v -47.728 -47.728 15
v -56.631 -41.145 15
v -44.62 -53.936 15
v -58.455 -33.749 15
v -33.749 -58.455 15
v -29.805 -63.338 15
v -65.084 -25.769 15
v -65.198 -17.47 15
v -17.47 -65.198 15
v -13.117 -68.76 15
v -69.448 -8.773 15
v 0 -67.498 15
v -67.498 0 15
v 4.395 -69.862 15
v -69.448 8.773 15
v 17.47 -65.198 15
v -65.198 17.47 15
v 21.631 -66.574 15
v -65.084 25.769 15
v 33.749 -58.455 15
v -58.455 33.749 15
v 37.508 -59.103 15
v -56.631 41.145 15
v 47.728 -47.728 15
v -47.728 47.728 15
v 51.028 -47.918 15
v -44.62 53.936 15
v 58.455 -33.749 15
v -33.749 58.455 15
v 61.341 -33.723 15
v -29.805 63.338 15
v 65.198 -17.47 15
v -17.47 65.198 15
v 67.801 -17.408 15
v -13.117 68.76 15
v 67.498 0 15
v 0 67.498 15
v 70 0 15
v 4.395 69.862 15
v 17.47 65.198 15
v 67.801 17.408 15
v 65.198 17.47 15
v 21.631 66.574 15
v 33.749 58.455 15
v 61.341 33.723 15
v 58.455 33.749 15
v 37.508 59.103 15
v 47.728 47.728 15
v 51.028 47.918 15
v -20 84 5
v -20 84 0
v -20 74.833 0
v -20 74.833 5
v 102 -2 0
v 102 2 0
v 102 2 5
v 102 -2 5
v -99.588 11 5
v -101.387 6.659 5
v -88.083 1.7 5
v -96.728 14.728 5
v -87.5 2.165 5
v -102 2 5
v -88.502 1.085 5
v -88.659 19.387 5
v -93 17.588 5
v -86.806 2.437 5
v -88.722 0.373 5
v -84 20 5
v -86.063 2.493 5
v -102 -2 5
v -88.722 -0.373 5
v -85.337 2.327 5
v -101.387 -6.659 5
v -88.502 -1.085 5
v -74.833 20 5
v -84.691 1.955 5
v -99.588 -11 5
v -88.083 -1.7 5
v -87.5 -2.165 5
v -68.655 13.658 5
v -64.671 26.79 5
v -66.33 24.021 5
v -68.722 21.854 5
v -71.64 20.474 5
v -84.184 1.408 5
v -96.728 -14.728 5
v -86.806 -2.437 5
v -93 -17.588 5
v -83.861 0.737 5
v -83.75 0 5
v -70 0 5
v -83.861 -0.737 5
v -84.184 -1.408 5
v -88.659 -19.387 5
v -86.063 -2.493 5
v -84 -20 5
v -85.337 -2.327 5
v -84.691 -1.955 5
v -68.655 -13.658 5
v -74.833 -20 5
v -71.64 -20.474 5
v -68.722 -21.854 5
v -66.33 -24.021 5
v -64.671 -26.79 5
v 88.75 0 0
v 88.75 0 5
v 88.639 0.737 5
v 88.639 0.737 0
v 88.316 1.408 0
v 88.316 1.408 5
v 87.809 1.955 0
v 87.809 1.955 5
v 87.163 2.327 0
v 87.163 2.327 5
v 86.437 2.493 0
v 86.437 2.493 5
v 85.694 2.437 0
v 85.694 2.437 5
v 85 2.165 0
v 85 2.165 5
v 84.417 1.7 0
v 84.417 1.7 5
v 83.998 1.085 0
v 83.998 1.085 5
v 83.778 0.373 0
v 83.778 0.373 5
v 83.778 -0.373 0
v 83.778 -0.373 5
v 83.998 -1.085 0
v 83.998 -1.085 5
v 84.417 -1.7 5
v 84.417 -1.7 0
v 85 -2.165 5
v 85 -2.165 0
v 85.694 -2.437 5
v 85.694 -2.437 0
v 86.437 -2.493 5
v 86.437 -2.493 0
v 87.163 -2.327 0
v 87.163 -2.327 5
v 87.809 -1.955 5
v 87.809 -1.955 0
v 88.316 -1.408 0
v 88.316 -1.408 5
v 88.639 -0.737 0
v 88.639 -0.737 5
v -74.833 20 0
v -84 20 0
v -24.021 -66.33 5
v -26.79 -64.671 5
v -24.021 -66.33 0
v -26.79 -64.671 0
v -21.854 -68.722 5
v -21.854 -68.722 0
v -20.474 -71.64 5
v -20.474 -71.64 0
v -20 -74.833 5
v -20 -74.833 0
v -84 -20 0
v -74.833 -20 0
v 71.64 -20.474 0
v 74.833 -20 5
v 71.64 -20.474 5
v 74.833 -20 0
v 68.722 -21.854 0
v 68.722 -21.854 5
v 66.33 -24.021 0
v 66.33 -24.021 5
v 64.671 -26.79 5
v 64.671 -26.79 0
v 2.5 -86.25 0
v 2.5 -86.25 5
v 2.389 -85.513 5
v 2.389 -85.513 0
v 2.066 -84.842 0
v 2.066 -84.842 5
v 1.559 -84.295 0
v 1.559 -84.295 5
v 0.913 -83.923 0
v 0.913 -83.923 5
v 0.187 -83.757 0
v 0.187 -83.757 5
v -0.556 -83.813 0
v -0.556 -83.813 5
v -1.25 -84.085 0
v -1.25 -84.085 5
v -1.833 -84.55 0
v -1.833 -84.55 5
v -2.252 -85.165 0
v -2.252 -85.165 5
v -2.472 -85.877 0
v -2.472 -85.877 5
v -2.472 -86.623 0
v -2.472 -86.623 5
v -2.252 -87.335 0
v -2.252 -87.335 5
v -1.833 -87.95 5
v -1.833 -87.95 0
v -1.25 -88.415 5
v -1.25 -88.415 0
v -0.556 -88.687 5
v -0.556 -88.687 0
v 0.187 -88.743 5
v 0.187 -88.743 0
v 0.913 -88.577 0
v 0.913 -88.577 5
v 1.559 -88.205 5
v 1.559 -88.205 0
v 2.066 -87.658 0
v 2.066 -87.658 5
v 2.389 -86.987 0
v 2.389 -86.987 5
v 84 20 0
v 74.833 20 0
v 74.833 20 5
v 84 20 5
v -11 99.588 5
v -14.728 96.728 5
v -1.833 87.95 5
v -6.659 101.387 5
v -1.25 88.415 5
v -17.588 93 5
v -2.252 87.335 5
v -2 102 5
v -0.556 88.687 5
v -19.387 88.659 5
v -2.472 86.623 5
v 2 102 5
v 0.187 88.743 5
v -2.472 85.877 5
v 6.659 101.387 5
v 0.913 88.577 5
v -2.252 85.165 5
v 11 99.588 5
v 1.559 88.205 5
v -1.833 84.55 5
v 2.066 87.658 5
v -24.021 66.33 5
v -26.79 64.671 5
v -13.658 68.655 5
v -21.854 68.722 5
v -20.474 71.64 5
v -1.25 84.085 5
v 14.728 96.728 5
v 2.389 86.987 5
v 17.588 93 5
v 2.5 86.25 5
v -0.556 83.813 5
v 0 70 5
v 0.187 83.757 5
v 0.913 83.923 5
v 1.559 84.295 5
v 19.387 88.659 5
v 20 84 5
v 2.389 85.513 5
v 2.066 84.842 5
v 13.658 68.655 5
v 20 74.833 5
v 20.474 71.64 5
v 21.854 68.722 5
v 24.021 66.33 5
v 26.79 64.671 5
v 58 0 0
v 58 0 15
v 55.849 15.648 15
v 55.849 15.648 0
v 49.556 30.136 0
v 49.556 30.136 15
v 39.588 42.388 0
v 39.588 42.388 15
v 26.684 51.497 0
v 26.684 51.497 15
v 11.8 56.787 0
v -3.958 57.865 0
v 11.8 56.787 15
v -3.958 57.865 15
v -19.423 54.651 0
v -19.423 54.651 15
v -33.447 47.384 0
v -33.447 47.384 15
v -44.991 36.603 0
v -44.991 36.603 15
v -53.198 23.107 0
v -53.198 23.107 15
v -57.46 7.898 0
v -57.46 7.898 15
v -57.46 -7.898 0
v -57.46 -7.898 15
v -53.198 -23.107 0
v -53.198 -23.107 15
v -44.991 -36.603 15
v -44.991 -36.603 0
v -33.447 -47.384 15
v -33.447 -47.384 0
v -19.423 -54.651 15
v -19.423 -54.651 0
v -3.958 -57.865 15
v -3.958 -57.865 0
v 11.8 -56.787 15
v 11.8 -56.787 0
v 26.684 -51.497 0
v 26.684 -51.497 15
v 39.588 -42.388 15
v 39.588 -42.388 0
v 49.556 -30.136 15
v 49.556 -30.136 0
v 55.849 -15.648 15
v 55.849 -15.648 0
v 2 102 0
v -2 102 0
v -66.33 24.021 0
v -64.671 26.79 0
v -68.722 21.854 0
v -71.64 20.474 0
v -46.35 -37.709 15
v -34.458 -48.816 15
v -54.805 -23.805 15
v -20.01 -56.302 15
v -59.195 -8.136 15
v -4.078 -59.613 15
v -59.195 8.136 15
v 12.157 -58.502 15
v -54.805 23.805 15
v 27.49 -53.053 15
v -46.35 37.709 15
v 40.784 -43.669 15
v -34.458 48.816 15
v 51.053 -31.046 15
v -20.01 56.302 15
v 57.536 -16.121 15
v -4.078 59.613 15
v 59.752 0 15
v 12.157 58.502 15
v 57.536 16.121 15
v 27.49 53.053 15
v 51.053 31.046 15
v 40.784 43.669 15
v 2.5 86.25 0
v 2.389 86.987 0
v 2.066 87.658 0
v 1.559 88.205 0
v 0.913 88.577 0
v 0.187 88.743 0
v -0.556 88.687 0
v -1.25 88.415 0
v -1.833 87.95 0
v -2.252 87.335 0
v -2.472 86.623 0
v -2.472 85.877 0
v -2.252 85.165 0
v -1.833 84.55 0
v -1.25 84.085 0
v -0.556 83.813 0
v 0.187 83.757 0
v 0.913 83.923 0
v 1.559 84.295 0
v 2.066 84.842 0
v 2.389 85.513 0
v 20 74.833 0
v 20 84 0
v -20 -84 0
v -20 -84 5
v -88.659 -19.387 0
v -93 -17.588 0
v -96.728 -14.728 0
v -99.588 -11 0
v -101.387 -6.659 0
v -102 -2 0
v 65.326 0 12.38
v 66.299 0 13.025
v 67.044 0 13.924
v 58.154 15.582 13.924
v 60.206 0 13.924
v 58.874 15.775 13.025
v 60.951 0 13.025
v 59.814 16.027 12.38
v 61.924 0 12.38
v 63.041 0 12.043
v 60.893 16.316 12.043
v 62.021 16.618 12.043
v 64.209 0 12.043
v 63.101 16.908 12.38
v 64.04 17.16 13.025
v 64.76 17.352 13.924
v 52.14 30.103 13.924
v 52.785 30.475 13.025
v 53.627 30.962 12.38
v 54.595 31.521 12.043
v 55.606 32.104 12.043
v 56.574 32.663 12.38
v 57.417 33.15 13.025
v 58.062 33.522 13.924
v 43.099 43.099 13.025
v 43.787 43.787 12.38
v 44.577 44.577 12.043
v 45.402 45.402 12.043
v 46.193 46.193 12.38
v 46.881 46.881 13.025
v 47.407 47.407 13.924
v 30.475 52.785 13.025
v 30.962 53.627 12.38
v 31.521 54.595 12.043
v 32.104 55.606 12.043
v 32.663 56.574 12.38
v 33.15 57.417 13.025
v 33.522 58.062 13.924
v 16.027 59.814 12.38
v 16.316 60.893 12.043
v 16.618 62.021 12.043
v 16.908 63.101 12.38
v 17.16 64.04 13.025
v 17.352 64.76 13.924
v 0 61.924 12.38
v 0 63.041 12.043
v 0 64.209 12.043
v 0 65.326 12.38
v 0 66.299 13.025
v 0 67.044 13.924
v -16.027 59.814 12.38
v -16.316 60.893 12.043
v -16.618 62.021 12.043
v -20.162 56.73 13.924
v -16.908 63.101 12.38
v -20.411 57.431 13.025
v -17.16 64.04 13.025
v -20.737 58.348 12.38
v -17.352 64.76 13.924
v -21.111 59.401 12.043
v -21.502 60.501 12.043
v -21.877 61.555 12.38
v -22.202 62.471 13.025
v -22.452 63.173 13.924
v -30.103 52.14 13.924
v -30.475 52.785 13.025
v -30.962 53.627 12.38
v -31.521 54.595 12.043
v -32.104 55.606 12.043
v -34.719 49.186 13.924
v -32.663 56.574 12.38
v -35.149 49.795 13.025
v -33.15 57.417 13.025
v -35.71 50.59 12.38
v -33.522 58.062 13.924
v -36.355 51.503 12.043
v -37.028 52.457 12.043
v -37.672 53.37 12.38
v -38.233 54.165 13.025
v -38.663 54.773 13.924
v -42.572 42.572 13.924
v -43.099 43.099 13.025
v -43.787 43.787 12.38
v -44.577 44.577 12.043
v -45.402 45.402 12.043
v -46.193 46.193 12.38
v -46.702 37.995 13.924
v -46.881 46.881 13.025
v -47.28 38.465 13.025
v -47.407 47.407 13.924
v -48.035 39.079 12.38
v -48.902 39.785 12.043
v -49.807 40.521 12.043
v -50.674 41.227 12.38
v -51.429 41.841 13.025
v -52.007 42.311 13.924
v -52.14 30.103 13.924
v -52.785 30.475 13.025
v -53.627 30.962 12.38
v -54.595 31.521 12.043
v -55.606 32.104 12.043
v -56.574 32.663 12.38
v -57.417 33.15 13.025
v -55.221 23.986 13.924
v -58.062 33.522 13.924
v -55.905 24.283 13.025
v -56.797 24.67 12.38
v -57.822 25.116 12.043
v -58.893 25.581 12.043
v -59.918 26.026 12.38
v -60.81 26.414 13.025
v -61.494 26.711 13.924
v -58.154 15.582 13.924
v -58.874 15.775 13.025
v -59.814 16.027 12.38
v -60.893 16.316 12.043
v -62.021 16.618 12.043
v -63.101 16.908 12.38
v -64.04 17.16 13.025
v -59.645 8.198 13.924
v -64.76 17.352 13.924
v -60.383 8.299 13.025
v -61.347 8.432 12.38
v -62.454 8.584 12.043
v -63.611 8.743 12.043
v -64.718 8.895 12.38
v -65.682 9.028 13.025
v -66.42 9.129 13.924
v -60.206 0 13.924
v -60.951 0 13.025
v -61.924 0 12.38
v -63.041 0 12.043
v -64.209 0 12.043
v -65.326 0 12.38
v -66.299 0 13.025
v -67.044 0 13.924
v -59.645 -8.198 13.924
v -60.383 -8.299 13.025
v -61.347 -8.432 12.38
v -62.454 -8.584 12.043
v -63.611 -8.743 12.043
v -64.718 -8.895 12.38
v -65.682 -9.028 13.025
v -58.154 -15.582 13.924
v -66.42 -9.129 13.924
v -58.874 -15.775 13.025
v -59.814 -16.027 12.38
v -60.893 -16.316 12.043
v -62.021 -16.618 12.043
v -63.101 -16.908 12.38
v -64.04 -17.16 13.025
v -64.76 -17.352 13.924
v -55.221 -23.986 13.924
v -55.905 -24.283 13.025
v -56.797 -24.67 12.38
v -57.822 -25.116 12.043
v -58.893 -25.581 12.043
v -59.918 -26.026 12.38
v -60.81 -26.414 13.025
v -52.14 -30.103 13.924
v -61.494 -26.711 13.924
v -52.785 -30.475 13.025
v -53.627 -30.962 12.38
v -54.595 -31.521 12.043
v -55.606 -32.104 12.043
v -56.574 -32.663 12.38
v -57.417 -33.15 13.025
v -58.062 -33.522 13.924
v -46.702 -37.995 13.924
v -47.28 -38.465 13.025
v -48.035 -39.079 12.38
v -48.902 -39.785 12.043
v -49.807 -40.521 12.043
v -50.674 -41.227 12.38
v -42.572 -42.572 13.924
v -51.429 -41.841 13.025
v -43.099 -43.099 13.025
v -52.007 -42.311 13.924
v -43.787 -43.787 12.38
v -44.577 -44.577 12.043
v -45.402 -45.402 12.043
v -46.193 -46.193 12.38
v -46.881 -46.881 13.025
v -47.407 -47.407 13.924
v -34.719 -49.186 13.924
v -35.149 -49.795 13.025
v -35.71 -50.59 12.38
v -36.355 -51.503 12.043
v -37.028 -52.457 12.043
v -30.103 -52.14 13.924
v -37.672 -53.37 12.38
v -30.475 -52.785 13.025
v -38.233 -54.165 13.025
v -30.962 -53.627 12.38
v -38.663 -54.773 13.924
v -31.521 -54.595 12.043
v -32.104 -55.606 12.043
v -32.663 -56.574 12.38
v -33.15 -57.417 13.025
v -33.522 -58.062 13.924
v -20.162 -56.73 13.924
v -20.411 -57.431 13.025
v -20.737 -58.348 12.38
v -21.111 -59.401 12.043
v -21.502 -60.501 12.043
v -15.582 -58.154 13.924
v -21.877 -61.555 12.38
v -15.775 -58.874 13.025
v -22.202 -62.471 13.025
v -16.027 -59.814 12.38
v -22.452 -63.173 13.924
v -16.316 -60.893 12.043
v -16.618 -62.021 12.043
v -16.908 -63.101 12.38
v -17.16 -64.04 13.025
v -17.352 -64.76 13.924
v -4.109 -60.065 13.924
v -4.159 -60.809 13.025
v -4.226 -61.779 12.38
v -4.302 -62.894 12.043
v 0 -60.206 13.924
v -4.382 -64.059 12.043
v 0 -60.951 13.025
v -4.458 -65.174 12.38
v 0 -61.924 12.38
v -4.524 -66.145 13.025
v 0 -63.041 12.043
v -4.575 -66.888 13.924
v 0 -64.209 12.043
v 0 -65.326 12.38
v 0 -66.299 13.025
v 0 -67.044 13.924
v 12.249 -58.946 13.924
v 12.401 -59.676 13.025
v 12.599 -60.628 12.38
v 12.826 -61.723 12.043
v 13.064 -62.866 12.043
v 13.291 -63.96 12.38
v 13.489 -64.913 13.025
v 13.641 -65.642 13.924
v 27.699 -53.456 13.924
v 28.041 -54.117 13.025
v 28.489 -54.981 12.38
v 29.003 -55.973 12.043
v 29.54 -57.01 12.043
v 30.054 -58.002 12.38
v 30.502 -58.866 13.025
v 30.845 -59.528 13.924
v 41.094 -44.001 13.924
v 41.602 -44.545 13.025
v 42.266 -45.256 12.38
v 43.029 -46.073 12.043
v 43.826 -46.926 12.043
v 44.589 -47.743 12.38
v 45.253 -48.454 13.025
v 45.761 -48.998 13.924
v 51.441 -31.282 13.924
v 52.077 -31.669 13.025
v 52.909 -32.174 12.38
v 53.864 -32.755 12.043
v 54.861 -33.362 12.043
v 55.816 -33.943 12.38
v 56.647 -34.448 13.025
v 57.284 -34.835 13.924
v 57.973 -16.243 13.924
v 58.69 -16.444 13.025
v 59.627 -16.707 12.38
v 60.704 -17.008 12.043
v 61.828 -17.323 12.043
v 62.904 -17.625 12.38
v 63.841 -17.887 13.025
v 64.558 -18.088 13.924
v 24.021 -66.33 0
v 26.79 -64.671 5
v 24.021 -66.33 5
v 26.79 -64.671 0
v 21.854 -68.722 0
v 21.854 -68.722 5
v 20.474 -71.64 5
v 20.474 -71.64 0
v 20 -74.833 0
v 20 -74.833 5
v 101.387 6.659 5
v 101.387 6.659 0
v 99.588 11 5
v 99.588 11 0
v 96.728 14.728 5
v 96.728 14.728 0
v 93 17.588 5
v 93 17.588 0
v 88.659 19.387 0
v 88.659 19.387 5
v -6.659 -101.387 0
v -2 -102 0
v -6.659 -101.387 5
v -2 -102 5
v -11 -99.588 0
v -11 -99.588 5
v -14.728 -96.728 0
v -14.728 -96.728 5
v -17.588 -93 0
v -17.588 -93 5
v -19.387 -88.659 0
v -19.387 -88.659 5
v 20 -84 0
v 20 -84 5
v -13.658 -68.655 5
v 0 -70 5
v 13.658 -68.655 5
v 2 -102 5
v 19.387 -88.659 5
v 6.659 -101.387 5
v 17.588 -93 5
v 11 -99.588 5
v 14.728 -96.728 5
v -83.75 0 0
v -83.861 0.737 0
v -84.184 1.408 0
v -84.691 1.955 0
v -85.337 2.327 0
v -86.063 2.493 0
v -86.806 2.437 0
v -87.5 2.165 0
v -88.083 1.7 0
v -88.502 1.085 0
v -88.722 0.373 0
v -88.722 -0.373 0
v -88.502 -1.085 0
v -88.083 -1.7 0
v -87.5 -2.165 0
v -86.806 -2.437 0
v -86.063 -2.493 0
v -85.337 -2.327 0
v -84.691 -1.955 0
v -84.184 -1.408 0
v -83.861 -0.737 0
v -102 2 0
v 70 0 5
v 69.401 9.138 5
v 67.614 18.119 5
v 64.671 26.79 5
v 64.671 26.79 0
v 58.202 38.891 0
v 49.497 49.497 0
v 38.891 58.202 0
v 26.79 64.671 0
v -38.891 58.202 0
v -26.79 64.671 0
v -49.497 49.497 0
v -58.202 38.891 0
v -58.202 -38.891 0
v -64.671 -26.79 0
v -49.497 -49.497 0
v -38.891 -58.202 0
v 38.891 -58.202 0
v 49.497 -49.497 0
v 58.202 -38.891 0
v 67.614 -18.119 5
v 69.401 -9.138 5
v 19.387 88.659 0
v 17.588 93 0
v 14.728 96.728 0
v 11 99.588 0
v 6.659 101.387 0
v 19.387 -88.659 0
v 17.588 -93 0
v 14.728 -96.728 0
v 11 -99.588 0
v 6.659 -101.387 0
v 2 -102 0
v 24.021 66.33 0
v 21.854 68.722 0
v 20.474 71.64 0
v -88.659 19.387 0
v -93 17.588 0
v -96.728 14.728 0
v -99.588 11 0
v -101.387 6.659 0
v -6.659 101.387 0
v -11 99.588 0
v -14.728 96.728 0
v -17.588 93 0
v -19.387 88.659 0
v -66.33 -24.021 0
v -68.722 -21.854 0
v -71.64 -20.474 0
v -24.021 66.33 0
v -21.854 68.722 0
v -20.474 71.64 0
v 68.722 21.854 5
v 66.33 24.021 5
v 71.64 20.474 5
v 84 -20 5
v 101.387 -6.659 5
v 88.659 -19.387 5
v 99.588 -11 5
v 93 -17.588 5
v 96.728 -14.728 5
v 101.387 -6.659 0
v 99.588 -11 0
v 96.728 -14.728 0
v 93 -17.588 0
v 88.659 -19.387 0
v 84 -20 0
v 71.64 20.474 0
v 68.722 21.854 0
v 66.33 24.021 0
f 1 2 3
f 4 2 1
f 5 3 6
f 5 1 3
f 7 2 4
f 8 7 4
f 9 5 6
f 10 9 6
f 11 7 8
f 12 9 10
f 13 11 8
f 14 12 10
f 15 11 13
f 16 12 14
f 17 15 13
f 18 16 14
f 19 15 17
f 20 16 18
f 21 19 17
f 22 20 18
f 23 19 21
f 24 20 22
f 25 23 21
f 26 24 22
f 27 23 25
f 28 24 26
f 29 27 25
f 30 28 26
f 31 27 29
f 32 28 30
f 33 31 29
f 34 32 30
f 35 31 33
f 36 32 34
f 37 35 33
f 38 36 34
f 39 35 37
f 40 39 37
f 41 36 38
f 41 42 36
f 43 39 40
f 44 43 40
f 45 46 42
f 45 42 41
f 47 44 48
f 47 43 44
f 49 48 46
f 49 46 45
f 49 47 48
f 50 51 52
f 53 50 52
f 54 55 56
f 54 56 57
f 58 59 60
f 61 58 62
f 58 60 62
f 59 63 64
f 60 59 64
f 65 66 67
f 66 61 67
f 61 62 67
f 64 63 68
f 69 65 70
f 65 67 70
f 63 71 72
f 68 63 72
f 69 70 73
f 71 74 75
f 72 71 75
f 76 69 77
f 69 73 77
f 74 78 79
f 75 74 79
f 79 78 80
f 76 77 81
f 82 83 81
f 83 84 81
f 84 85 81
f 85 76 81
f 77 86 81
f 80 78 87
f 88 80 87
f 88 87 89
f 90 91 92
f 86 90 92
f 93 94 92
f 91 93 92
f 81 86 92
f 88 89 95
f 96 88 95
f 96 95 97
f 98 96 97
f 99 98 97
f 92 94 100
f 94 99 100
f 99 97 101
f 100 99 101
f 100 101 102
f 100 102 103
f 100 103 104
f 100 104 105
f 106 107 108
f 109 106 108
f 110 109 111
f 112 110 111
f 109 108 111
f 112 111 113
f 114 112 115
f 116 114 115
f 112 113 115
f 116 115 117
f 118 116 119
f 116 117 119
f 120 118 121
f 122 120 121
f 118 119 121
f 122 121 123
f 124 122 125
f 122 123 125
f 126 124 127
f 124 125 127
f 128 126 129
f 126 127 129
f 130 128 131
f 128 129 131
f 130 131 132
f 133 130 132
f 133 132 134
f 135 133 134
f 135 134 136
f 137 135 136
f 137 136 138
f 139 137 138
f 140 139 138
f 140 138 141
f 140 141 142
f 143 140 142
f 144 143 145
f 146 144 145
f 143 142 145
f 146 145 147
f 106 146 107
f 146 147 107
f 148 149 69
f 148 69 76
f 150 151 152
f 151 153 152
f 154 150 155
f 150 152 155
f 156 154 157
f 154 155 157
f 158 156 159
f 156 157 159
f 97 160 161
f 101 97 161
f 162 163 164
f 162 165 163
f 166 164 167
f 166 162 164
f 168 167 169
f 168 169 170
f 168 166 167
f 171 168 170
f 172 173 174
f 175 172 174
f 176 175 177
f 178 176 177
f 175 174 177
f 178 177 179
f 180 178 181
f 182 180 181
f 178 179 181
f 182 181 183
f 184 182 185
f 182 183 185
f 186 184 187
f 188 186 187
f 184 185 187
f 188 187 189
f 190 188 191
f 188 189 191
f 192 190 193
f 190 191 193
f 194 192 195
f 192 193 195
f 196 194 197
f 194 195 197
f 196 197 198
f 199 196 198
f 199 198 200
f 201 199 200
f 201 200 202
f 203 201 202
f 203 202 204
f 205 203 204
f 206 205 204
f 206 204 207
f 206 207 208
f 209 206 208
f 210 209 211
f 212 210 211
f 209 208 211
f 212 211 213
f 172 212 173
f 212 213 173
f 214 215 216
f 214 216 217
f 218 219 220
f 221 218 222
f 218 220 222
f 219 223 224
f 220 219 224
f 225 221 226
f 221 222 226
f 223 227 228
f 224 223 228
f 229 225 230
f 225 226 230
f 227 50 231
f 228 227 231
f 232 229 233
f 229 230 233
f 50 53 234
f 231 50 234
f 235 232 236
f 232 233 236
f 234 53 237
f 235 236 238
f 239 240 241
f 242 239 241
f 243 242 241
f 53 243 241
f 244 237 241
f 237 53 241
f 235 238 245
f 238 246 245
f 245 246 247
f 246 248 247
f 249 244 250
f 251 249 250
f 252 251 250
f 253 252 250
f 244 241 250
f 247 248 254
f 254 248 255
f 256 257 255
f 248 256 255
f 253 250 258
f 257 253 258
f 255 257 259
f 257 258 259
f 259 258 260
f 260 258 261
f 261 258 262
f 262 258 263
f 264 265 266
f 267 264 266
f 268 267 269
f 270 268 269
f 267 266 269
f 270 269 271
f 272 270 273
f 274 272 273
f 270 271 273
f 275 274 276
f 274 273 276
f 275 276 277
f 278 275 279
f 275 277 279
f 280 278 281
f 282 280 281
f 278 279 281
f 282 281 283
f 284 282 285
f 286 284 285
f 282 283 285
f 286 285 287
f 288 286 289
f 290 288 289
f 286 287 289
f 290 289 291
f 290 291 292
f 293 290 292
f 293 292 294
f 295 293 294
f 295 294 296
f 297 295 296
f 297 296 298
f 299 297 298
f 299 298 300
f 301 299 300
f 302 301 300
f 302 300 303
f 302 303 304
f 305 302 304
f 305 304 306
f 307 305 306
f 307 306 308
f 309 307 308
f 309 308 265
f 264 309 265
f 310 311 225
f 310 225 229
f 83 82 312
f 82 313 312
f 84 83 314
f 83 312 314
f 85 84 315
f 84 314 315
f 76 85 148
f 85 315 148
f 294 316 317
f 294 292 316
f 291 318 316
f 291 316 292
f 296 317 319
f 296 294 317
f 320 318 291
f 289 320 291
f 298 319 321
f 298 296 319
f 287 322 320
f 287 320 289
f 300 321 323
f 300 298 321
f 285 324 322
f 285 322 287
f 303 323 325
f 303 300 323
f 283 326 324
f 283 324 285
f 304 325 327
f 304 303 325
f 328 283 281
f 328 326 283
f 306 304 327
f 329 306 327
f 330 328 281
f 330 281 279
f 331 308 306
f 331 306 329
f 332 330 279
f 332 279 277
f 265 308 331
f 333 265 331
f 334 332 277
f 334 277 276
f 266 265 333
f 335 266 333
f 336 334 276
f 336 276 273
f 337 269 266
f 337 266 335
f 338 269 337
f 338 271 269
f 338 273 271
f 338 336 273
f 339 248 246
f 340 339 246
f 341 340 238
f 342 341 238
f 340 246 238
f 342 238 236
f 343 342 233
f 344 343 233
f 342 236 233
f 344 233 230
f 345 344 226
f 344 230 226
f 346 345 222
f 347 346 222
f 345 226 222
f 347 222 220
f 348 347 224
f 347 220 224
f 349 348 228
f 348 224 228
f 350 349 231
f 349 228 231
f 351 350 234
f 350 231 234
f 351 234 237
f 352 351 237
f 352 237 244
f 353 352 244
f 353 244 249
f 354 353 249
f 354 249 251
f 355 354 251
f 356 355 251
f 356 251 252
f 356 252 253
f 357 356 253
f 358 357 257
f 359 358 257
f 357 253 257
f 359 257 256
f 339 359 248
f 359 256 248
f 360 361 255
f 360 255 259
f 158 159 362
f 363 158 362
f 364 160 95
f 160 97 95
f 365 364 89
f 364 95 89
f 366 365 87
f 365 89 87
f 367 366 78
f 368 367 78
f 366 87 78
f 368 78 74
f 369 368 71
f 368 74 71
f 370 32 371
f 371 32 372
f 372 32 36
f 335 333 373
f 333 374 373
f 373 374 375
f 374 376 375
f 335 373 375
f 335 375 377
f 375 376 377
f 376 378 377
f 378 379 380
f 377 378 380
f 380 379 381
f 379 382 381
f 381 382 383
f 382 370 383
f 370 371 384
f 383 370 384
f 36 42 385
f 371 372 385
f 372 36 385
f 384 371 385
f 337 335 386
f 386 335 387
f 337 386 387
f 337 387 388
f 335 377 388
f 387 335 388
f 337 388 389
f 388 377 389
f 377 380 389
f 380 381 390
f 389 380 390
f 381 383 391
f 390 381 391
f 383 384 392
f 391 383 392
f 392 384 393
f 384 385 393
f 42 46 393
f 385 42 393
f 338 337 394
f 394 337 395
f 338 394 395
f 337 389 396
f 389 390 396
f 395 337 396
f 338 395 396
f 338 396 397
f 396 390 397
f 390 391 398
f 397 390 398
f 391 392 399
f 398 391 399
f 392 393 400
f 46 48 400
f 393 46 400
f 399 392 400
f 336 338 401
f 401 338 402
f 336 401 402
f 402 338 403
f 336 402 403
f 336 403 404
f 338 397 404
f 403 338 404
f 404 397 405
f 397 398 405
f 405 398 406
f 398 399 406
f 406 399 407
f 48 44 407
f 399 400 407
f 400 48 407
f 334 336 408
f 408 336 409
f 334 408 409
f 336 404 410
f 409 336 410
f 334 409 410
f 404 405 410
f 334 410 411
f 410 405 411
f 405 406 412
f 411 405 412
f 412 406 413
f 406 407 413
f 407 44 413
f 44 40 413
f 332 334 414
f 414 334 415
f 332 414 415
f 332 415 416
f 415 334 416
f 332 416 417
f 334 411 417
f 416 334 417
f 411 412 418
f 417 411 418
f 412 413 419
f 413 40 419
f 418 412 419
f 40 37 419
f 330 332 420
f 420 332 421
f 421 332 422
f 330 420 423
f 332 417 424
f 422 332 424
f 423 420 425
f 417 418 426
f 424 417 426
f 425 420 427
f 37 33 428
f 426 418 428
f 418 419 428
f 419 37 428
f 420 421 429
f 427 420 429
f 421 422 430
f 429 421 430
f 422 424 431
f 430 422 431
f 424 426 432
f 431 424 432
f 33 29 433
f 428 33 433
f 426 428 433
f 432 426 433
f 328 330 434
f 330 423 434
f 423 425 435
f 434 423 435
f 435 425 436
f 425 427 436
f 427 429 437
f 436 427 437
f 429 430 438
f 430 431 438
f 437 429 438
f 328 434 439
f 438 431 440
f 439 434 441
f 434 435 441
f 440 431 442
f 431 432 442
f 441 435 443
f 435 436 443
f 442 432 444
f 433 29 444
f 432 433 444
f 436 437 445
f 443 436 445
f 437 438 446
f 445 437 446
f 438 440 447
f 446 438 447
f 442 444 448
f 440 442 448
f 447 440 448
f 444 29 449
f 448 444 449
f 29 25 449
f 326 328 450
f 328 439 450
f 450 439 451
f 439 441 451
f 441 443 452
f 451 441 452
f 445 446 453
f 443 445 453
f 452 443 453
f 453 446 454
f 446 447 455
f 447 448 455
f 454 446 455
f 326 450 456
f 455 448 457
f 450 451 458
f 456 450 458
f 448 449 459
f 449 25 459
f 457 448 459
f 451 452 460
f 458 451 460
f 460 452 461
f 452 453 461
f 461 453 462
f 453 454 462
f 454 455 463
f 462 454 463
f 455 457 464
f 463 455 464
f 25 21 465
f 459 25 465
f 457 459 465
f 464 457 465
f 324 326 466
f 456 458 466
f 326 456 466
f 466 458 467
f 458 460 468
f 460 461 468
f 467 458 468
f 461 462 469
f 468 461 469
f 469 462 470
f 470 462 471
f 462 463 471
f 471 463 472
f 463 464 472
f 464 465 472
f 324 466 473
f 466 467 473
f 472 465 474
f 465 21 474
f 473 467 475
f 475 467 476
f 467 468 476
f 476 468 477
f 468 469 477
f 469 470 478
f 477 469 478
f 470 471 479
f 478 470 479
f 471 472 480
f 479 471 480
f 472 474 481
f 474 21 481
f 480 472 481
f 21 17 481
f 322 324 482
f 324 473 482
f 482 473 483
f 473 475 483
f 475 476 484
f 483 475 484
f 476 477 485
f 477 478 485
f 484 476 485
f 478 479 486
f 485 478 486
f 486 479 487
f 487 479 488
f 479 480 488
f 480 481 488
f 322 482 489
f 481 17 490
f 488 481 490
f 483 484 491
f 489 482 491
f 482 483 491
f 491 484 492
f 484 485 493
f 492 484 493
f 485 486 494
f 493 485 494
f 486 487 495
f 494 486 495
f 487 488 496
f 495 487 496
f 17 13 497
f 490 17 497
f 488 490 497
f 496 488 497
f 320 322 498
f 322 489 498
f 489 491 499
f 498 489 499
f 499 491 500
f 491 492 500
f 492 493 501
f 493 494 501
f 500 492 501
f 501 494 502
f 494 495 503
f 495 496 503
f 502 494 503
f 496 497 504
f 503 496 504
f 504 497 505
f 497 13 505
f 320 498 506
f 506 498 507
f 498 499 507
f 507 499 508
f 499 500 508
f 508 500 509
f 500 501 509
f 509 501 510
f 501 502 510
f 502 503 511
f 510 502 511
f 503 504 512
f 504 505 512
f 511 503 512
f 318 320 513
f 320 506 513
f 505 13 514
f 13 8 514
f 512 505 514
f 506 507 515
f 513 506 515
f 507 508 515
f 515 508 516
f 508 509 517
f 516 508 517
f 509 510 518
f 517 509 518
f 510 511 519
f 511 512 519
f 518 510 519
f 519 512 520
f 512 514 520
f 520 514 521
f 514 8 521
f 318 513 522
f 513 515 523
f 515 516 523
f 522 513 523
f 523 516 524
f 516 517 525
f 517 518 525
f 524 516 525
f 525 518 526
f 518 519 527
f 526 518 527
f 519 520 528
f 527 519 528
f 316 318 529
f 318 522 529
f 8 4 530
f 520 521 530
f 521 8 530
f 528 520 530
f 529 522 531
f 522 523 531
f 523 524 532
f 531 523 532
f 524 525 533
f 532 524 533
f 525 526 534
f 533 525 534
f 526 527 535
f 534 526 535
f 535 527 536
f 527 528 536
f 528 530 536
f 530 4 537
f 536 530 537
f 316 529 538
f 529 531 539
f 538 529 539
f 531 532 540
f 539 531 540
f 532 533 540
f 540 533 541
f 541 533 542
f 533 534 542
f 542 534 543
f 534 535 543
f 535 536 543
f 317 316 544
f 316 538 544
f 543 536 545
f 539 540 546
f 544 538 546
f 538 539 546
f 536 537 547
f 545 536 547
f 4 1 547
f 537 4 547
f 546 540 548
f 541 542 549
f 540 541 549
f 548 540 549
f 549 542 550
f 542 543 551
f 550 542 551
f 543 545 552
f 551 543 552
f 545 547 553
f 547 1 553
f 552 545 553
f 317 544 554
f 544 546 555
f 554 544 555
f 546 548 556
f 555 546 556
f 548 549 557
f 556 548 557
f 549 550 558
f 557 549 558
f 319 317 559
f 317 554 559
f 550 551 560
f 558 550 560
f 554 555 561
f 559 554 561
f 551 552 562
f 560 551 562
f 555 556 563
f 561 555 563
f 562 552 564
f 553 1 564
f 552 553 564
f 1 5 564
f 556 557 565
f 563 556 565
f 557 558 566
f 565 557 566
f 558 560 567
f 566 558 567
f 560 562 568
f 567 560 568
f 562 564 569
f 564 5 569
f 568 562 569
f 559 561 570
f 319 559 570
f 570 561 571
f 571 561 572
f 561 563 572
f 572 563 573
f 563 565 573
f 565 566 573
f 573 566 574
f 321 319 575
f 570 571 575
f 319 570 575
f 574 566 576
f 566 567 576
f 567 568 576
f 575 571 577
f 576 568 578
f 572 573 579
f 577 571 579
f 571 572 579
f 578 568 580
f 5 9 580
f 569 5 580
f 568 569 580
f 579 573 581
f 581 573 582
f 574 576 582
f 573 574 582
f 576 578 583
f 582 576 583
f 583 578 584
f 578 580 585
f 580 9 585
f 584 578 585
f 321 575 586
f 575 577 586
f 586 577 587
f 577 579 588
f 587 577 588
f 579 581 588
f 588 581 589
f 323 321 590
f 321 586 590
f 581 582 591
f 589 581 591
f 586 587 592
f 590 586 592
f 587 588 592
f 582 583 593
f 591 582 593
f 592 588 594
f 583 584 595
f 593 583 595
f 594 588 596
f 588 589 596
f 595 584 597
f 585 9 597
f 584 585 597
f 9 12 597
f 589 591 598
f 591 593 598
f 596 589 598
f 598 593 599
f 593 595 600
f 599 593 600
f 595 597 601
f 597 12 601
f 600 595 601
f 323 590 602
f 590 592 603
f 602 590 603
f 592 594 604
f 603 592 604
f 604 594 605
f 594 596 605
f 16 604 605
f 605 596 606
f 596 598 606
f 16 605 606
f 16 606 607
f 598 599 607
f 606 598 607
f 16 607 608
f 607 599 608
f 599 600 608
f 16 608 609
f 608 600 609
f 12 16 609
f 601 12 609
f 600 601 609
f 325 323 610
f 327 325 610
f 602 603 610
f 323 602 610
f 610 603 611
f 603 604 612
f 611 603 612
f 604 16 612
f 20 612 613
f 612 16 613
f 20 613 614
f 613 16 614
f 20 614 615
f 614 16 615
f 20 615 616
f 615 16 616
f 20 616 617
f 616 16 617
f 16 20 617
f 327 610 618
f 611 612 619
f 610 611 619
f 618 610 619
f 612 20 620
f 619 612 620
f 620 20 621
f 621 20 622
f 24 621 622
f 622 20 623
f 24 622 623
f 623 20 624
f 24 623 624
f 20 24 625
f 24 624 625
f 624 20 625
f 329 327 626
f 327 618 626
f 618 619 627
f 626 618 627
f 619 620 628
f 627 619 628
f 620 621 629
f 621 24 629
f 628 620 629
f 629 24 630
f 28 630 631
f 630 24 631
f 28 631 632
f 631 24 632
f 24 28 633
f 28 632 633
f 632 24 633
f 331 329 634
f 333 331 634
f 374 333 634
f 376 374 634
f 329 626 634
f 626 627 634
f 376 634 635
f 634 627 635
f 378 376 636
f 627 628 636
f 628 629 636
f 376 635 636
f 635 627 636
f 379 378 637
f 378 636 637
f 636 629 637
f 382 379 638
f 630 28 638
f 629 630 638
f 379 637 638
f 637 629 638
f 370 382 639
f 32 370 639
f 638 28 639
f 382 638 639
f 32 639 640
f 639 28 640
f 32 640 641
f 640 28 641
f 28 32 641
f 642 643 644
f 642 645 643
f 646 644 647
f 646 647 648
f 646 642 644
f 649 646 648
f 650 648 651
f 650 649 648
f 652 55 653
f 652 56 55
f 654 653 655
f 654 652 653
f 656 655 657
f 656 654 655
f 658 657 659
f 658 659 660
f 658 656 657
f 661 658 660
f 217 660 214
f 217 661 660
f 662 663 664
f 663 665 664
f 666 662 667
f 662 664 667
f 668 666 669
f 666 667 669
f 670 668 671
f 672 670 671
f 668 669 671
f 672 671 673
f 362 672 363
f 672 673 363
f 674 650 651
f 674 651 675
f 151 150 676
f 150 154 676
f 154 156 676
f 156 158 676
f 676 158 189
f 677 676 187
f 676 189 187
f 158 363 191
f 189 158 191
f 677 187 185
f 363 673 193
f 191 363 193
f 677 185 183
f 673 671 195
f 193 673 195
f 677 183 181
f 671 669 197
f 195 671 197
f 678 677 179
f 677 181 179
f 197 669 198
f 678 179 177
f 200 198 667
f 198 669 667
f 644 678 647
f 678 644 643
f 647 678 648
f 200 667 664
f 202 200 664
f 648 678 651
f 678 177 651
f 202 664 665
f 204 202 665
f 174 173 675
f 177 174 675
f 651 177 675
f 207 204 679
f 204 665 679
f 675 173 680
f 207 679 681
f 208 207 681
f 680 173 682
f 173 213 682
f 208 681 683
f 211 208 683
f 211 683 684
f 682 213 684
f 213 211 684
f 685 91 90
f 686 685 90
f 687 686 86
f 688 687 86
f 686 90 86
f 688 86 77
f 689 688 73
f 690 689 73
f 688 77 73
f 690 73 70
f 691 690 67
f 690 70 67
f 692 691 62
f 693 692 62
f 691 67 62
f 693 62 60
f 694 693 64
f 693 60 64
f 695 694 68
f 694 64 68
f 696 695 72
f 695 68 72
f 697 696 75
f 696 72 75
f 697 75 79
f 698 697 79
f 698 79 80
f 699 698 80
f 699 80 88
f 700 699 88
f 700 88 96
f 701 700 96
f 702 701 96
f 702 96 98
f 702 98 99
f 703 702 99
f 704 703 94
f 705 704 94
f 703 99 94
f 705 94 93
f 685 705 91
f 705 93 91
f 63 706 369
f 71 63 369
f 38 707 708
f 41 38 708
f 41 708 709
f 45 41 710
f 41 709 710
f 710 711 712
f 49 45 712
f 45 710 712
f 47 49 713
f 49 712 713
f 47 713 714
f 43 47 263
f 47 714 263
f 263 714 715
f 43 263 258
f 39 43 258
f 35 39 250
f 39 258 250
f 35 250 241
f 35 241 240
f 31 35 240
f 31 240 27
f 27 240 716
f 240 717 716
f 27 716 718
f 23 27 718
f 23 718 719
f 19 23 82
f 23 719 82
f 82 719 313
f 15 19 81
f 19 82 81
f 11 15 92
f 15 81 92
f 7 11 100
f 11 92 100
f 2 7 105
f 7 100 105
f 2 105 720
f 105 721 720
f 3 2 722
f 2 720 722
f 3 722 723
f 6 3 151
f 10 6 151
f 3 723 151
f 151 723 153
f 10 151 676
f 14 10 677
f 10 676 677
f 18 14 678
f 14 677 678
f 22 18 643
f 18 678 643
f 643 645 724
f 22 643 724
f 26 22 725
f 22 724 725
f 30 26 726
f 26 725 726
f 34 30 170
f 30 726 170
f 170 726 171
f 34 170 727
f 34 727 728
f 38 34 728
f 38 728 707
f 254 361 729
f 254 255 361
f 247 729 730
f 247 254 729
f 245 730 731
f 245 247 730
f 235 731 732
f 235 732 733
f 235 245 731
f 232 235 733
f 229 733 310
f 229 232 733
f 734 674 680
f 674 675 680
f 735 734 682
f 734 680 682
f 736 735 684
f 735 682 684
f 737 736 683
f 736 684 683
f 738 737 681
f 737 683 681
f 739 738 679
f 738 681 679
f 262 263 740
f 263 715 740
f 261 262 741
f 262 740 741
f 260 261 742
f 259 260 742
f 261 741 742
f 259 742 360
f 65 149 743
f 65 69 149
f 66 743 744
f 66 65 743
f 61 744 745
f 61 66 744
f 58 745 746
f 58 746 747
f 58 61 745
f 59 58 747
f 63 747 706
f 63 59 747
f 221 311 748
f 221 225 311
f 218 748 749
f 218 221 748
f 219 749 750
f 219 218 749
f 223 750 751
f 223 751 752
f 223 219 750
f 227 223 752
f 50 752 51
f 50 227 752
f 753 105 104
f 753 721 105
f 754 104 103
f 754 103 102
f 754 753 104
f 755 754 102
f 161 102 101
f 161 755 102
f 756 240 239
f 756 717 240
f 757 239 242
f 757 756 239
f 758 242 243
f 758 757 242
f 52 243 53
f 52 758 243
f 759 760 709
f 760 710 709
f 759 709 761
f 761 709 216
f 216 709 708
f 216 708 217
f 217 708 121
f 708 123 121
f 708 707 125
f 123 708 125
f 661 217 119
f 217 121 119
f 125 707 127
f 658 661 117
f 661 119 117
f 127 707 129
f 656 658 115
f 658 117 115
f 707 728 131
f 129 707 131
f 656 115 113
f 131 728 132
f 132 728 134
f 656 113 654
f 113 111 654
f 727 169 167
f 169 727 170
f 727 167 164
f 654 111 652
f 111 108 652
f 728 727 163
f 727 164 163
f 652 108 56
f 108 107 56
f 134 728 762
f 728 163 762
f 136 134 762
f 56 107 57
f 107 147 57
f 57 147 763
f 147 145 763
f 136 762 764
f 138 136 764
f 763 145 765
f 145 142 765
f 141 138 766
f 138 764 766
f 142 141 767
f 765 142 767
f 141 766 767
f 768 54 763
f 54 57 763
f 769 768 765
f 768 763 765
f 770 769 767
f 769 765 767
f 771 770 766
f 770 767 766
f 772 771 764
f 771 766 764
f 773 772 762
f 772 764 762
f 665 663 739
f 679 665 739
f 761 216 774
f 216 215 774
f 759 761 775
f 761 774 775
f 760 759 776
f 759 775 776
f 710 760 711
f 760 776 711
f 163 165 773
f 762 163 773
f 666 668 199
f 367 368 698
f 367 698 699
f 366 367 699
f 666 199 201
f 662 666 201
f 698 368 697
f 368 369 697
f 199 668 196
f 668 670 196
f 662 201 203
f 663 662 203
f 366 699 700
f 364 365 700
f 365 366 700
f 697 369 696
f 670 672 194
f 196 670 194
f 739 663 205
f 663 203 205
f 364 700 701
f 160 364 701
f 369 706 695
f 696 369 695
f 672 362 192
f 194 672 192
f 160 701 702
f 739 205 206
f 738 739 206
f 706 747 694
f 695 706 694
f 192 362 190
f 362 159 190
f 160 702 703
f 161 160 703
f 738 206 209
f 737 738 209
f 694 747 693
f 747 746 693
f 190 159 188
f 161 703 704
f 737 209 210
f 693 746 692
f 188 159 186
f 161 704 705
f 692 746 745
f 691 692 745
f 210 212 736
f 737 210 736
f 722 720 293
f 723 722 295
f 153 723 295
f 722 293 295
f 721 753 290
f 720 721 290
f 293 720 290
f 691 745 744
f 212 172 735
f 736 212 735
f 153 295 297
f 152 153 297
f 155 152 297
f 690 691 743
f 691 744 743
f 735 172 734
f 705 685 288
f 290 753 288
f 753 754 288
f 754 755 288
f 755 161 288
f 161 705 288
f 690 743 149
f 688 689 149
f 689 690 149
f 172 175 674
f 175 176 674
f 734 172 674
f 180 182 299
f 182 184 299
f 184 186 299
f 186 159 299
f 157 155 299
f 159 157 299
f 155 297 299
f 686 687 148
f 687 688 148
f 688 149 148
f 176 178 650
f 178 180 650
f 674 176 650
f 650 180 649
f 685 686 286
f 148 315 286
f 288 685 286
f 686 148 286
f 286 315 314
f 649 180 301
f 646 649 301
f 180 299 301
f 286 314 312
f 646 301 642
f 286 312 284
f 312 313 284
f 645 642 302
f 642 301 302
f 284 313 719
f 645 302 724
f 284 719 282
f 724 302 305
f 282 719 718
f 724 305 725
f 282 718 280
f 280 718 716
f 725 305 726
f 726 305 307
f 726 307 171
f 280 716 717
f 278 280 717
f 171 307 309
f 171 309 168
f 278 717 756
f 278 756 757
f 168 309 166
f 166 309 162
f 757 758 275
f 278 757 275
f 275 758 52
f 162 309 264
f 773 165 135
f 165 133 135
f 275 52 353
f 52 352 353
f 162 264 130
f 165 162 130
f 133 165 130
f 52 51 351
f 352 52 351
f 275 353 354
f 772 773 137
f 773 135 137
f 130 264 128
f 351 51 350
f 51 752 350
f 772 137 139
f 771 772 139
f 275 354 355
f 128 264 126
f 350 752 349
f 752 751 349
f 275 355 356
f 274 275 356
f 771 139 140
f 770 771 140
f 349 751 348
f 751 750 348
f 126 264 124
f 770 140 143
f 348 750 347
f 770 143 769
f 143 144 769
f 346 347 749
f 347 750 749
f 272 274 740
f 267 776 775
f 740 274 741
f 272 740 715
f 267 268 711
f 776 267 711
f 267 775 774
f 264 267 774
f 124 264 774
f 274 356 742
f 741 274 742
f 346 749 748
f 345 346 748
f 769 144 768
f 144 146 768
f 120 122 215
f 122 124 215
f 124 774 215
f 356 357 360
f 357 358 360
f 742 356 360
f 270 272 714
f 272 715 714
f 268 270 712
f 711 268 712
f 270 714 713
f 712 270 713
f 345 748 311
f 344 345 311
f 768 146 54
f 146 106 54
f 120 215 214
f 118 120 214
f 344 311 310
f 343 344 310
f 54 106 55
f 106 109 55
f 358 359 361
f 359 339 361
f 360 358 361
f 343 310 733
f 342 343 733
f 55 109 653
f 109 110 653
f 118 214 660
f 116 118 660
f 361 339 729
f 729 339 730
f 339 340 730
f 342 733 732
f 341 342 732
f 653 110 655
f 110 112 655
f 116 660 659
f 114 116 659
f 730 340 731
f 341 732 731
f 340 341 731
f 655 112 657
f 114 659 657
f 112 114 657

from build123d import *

# Parameters (mm, degrees)
SKETCH_R        = 70
SKETCH_R_2      = 57.25
PAD_DEPTH       = 15
SKETCH001_R     = 4
SKETCH002_W     = 40
SKETCH002_H     = 40
PAD001_DEPTH    = 5
SKETCH003_R     = 2.5
POCKET_DEPTH    = 5
FILLET_R        = 18
FILLET001_R     = 11
SKETCH004_R     = 58
POCKET001_DEPTH = 15.001


with BuildPart() as part:
    # Sketch → Pad (new body)
    with BuildSketch(Plane.XY):
        Circle(SKETCH_R)
        Circle(SKETCH_R_2, mode=Mode.SUBTRACT)
    extrude(amount=PAD_DEPTH)

    # Sketch001 → Groove (revolve, cut)
    with BuildSketch(Plane.XZ):
        with Locations((63.625, 16)):
            Circle(SKETCH001_R)
    revolve(axis=Axis((0, 0, 0), (0, 0, 1)), mode=Mode.SUBTRACT)

    # Sketch002 (on Face2 of Groove) → Pad001 (join)
    with BuildSketch(Plane(origin=(0, 0, 0), x_dir=(1, 0, 0), z_dir=(0, 0, -1))):
        with Locations((82, 0)):
            Rectangle(SKETCH002_W, SKETCH002_H)
        with Locations((-82, 0)):
            Rectangle(SKETCH002_W, SKETCH002_H)
        with Locations((0, 82)):
            Rectangle(SKETCH002_W, SKETCH002_H)
        with Locations((0, -82)):
            Rectangle(SKETCH002_W, SKETCH002_H)
    extrude(amount=-PAD001_DEPTH)

    # Sketch003 (on Face13 of Pad001) → Pocket (cut)
    with BuildSketch(Plane.XY.offset(5)):
        with Locations((-86.25, 0)):
            Circle(SKETCH003_R)
        with Locations((0, -86.25)):
            Circle(SKETCH003_R)
        with Locations((86.25, 0)):
            Circle(SKETCH003_R)
        with Locations((0, 86.25)):
            Circle(SKETCH003_R)
    extrude(amount=-POCKET_DEPTH, mode=Mode.SUBTRACT)

    # Fillet
    fillet_edges = [part.edges().sort_by_distance(p)[0] for p in [
        (-20, 102, 2.5),
        (20, 102, 2.5),
        (102, 20, 2.5),
        (102, -20, 2.5),
        (20, -102, 2.5),
        (-20, -102, 2.5),
        (-102, -20, 2.5),
        (-102, 20, 2.5),
    ]]
    fillet(fillet_edges, radius=FILLET_R)

    # Fillet001
    fillet001_edges = [part.edges().sort_by_distance(p)[0] for p in [
        (67.082039, 20, 2.5),
        (20, 67.082039, 2.5),
        (-20, 67.082039, 2.5),
        (-67.082039, 20, 2.5),
        (-67.082039, -20, 2.5),
        (-20, -67.082039, 2.5),
        (20, -67.082039, 2.5),
        (67.082039, -20, 2.5),
    ]]
    fillet(fillet001_edges, radius=FILLET001_R)

    # Sketch004 (on Face41 of Fillet001) → Pocket001 (cut, through all)
    with BuildSketch(Plane.XY.offset(15)):
        Circle(SKETCH004_R)
    extrude(amount=-POCKET001_DEPTH, mode=Mode.SUBTRACT)


solid = part.part
